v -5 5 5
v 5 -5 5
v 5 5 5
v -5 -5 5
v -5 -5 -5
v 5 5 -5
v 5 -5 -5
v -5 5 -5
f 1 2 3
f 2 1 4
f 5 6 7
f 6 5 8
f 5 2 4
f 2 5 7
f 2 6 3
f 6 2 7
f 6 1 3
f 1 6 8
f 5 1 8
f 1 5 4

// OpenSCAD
// Lines starting with a // are comments!
// The following command creates a Cube:
cube(size = [10, 10, 10], center = true);
